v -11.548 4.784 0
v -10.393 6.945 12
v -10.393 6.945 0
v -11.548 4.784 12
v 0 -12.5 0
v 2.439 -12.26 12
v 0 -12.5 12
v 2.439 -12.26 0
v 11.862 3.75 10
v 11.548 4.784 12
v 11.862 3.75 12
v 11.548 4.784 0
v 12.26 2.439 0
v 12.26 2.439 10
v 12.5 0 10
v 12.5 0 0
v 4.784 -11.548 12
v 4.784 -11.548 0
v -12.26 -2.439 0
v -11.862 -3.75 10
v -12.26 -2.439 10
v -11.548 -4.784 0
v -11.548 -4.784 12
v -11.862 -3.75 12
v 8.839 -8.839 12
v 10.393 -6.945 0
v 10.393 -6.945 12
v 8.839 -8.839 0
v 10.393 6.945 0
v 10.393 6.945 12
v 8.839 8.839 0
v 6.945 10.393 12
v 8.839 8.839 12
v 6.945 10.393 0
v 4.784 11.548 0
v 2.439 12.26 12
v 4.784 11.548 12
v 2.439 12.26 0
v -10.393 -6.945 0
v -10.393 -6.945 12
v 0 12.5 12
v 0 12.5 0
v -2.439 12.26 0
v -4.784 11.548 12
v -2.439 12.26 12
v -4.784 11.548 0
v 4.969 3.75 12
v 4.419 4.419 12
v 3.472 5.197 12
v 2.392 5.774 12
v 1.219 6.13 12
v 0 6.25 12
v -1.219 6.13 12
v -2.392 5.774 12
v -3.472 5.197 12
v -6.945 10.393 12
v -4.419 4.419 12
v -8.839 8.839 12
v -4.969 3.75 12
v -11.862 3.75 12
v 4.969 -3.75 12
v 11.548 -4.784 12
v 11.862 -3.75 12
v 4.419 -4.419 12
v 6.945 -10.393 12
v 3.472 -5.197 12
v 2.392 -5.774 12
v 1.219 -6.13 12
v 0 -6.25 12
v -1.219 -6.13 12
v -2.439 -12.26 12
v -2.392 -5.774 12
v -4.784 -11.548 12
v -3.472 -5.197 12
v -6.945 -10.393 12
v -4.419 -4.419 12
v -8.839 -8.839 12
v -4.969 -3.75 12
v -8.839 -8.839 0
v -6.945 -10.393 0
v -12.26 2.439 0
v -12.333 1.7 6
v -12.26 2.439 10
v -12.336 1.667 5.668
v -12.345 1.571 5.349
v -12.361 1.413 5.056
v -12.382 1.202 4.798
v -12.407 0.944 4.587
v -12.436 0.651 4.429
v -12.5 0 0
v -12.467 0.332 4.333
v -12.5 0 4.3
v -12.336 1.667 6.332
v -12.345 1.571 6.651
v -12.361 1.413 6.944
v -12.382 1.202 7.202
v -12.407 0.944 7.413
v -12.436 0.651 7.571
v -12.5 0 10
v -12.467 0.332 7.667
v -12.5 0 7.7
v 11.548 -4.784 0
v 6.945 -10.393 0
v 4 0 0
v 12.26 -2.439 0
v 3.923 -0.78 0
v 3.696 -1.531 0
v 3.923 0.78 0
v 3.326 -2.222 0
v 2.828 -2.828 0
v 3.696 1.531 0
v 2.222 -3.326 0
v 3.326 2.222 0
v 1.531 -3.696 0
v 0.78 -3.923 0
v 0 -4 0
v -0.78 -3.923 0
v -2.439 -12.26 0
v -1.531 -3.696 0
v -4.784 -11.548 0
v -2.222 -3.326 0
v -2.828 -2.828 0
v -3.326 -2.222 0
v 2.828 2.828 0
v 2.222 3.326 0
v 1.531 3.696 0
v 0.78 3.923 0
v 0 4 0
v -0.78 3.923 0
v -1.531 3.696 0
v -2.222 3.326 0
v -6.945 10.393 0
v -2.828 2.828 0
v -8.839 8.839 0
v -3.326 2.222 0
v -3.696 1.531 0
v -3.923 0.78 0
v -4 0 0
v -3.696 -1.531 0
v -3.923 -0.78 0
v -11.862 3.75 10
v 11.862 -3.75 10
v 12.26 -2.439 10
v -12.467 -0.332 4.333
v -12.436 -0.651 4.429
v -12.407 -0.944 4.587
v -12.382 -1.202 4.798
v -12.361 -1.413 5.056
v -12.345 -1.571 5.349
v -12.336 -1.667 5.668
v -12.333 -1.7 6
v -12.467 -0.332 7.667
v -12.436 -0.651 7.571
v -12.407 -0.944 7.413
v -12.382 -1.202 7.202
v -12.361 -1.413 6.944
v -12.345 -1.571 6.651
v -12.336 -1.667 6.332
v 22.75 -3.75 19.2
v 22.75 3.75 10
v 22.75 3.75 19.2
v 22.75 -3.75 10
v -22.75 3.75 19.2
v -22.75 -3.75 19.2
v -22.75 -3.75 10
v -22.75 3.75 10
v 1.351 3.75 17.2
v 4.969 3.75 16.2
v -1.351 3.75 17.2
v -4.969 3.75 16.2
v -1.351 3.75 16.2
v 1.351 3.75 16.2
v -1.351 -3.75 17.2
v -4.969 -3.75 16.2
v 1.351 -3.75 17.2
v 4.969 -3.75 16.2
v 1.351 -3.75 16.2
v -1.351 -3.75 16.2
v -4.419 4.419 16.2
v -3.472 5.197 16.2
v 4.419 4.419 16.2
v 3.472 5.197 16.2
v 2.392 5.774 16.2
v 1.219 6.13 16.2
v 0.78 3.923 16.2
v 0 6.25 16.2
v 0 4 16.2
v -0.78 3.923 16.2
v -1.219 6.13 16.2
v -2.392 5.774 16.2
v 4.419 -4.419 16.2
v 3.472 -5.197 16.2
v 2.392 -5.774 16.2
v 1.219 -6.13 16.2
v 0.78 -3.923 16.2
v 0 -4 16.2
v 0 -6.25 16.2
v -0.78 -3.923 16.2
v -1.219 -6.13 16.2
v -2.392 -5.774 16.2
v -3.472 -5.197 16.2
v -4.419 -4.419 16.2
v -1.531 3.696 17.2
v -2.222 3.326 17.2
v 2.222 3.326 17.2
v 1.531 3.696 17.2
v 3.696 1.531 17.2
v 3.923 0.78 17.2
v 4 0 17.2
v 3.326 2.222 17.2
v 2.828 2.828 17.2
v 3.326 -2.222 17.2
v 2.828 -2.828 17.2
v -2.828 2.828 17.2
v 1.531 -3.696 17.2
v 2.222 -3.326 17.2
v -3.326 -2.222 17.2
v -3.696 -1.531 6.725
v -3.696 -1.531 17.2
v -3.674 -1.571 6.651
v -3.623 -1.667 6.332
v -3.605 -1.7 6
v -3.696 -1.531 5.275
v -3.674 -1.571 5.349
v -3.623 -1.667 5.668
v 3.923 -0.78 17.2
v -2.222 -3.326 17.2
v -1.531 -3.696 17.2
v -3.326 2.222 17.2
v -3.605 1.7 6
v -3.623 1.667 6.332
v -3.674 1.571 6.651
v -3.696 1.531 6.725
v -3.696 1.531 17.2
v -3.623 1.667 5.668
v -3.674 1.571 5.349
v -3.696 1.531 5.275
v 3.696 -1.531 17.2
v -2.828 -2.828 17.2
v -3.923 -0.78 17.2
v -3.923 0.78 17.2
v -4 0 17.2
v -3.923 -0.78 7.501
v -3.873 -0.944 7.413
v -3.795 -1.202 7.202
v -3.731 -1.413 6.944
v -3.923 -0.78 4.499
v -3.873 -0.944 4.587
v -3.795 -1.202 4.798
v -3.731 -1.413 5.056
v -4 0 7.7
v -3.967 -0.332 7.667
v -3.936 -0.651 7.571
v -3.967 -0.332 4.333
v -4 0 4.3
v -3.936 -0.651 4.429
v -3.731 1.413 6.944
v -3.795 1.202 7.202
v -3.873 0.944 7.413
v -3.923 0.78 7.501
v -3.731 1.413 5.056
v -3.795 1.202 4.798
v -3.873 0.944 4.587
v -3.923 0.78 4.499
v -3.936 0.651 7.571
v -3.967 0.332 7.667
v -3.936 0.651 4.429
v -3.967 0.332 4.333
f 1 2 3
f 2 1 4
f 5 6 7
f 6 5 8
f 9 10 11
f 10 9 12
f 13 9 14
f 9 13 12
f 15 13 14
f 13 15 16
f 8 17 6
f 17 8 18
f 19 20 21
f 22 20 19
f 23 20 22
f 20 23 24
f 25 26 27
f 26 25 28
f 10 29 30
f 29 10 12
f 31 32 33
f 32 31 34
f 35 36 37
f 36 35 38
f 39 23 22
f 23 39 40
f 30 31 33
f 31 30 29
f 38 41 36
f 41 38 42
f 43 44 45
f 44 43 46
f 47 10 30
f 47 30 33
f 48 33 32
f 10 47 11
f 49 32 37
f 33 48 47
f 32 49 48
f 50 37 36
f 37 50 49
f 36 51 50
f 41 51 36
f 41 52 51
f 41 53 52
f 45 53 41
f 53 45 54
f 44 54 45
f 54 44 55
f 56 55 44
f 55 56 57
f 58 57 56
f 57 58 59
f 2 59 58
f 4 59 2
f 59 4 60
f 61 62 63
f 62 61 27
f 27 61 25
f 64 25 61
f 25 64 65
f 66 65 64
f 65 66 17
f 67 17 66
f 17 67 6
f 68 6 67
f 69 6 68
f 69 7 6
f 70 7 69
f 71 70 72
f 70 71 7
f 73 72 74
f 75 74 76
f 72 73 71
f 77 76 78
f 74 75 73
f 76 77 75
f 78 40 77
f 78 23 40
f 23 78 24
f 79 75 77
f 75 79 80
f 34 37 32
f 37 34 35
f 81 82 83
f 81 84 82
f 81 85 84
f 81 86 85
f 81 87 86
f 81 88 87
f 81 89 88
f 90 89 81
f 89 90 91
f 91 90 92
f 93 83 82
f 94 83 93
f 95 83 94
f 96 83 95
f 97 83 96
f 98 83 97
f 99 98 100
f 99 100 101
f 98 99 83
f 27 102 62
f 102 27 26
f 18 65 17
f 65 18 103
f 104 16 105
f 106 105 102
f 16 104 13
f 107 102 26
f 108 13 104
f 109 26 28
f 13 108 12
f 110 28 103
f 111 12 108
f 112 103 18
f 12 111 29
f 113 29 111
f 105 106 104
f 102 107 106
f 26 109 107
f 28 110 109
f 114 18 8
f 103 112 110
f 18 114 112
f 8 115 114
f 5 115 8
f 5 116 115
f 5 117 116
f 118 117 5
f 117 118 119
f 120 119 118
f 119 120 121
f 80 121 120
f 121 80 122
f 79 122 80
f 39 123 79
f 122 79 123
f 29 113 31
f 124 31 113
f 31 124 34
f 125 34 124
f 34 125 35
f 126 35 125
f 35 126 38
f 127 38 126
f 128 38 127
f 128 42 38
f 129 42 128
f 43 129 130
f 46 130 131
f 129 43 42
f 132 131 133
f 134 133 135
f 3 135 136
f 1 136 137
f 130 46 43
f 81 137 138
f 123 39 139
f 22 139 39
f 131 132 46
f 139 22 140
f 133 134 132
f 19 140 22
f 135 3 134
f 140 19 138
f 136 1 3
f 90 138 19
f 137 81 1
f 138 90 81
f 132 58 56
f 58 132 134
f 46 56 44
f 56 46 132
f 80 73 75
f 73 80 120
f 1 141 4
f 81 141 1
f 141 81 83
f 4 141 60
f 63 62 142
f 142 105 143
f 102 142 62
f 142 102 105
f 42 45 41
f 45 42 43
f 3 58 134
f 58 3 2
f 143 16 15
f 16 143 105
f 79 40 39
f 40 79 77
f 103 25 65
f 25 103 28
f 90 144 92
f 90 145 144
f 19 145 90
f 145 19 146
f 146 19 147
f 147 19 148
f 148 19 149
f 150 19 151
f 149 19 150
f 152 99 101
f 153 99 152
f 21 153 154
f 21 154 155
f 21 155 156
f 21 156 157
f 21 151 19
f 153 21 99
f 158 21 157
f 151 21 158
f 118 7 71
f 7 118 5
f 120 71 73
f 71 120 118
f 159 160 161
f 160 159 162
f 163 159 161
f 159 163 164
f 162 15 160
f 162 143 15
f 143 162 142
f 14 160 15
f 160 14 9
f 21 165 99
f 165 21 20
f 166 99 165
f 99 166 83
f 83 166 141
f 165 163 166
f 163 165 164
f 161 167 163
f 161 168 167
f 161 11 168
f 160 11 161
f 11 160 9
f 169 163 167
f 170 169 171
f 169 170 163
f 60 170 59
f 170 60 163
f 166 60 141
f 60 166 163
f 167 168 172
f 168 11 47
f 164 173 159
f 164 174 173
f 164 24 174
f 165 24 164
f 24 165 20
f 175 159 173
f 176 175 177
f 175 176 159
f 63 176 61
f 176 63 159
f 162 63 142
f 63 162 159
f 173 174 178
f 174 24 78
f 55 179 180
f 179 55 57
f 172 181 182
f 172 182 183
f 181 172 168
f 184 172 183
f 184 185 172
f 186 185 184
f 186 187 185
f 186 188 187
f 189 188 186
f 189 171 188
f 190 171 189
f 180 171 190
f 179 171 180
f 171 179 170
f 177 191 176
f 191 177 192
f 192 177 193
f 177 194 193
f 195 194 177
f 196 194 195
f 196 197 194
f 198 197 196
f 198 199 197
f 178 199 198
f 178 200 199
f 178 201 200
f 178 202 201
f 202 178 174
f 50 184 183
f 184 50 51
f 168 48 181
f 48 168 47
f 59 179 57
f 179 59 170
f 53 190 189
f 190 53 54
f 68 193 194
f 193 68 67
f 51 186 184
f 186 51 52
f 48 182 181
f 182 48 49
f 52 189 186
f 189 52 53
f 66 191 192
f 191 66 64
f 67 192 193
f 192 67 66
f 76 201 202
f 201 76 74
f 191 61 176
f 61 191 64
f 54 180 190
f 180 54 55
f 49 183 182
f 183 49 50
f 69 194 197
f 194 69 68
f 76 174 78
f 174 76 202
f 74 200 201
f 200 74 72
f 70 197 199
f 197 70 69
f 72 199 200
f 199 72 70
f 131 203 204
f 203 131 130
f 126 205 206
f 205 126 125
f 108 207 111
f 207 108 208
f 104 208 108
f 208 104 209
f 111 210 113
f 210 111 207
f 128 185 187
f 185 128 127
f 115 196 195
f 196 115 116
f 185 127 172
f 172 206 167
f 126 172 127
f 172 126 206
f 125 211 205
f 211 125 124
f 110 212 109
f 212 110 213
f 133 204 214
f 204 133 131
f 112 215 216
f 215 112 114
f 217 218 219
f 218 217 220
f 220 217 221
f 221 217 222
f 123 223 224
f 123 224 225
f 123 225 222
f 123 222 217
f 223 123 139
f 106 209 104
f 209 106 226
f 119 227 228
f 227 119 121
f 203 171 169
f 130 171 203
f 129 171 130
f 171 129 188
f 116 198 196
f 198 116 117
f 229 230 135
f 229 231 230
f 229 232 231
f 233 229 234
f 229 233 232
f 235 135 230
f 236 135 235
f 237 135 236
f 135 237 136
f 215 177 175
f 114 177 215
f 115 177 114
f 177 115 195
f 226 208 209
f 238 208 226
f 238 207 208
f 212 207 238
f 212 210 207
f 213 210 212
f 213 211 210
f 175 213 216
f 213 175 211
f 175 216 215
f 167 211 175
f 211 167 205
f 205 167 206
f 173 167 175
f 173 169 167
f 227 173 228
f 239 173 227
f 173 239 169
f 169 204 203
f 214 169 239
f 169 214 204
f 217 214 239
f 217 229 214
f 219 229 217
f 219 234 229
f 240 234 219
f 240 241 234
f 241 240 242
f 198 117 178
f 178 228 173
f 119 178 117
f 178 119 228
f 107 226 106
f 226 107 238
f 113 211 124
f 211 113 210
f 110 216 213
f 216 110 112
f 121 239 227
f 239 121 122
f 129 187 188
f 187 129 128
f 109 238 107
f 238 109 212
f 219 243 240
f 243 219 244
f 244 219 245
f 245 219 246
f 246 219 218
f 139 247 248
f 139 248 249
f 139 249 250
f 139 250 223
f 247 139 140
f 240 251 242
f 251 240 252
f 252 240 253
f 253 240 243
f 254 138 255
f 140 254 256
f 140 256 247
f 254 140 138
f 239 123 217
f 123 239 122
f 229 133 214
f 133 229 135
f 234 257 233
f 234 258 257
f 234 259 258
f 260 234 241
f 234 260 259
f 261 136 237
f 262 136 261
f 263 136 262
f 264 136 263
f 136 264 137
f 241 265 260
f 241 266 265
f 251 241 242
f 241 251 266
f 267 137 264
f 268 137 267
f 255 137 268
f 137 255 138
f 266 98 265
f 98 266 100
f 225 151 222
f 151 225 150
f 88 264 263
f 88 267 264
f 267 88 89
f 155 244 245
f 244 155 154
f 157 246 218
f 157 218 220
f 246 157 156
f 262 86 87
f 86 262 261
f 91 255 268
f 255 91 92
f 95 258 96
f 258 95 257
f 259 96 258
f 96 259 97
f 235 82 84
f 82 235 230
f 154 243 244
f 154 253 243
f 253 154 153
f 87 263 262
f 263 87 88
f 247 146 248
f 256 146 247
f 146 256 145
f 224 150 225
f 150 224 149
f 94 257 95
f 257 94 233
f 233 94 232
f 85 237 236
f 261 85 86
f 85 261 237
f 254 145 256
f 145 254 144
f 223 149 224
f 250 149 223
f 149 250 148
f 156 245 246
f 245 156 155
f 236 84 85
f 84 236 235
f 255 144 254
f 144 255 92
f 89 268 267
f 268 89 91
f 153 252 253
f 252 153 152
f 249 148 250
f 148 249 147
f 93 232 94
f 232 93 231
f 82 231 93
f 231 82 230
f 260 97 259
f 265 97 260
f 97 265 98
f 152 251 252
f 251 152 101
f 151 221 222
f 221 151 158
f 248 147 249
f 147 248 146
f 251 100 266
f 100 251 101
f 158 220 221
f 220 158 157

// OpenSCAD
$fn = 32;

// ----------------------------------------------------------------------
// Hand knob: 25 x 45.5 x 16.2 mm
// ----------------------------------------------------------------------

// --- parameters (mm) ---
head_d = 25;              // knob diameter
head_h = 12;              // knob height
hole_d = 8;               // shaft bore
set_d = 3.4;              // set screw tap hole
wing_l = 45.5;            // wing span
wing_w = 7.5;             // wing width
wing_h = 7.2;             // wing thickness
cap_h = 4.2;              // raised centre cap
cap_d = 12.5;             // centre cap diameter

module body() {
  cylinder(h = head_h, d = head_d);
}

module wing() {
  /* wing sunk 2 mm into the knob so the joint overlaps */
  translate([-wing_l / 2, -wing_w / 2, head_h - 2])
    cube([wing_l, wing_w, wing_h + 2]);
}

module cap() {
  translate([0, 0, head_h - 1]) cylinder(h = cap_h + 1, d = cap_d);
}

difference() {
  union() {
    body();
    wing();
    cap();
  }
  translate([0, 0, -1]) cylinder(h = head_h + cap_h + 2, d = hole_d);
  translate([-head_d / 2 - 1, 0, head_h * 0.5]) rotate([0, 90, 0]) cylinder(h = head_d / 2 + 2, d = set_d);
}
